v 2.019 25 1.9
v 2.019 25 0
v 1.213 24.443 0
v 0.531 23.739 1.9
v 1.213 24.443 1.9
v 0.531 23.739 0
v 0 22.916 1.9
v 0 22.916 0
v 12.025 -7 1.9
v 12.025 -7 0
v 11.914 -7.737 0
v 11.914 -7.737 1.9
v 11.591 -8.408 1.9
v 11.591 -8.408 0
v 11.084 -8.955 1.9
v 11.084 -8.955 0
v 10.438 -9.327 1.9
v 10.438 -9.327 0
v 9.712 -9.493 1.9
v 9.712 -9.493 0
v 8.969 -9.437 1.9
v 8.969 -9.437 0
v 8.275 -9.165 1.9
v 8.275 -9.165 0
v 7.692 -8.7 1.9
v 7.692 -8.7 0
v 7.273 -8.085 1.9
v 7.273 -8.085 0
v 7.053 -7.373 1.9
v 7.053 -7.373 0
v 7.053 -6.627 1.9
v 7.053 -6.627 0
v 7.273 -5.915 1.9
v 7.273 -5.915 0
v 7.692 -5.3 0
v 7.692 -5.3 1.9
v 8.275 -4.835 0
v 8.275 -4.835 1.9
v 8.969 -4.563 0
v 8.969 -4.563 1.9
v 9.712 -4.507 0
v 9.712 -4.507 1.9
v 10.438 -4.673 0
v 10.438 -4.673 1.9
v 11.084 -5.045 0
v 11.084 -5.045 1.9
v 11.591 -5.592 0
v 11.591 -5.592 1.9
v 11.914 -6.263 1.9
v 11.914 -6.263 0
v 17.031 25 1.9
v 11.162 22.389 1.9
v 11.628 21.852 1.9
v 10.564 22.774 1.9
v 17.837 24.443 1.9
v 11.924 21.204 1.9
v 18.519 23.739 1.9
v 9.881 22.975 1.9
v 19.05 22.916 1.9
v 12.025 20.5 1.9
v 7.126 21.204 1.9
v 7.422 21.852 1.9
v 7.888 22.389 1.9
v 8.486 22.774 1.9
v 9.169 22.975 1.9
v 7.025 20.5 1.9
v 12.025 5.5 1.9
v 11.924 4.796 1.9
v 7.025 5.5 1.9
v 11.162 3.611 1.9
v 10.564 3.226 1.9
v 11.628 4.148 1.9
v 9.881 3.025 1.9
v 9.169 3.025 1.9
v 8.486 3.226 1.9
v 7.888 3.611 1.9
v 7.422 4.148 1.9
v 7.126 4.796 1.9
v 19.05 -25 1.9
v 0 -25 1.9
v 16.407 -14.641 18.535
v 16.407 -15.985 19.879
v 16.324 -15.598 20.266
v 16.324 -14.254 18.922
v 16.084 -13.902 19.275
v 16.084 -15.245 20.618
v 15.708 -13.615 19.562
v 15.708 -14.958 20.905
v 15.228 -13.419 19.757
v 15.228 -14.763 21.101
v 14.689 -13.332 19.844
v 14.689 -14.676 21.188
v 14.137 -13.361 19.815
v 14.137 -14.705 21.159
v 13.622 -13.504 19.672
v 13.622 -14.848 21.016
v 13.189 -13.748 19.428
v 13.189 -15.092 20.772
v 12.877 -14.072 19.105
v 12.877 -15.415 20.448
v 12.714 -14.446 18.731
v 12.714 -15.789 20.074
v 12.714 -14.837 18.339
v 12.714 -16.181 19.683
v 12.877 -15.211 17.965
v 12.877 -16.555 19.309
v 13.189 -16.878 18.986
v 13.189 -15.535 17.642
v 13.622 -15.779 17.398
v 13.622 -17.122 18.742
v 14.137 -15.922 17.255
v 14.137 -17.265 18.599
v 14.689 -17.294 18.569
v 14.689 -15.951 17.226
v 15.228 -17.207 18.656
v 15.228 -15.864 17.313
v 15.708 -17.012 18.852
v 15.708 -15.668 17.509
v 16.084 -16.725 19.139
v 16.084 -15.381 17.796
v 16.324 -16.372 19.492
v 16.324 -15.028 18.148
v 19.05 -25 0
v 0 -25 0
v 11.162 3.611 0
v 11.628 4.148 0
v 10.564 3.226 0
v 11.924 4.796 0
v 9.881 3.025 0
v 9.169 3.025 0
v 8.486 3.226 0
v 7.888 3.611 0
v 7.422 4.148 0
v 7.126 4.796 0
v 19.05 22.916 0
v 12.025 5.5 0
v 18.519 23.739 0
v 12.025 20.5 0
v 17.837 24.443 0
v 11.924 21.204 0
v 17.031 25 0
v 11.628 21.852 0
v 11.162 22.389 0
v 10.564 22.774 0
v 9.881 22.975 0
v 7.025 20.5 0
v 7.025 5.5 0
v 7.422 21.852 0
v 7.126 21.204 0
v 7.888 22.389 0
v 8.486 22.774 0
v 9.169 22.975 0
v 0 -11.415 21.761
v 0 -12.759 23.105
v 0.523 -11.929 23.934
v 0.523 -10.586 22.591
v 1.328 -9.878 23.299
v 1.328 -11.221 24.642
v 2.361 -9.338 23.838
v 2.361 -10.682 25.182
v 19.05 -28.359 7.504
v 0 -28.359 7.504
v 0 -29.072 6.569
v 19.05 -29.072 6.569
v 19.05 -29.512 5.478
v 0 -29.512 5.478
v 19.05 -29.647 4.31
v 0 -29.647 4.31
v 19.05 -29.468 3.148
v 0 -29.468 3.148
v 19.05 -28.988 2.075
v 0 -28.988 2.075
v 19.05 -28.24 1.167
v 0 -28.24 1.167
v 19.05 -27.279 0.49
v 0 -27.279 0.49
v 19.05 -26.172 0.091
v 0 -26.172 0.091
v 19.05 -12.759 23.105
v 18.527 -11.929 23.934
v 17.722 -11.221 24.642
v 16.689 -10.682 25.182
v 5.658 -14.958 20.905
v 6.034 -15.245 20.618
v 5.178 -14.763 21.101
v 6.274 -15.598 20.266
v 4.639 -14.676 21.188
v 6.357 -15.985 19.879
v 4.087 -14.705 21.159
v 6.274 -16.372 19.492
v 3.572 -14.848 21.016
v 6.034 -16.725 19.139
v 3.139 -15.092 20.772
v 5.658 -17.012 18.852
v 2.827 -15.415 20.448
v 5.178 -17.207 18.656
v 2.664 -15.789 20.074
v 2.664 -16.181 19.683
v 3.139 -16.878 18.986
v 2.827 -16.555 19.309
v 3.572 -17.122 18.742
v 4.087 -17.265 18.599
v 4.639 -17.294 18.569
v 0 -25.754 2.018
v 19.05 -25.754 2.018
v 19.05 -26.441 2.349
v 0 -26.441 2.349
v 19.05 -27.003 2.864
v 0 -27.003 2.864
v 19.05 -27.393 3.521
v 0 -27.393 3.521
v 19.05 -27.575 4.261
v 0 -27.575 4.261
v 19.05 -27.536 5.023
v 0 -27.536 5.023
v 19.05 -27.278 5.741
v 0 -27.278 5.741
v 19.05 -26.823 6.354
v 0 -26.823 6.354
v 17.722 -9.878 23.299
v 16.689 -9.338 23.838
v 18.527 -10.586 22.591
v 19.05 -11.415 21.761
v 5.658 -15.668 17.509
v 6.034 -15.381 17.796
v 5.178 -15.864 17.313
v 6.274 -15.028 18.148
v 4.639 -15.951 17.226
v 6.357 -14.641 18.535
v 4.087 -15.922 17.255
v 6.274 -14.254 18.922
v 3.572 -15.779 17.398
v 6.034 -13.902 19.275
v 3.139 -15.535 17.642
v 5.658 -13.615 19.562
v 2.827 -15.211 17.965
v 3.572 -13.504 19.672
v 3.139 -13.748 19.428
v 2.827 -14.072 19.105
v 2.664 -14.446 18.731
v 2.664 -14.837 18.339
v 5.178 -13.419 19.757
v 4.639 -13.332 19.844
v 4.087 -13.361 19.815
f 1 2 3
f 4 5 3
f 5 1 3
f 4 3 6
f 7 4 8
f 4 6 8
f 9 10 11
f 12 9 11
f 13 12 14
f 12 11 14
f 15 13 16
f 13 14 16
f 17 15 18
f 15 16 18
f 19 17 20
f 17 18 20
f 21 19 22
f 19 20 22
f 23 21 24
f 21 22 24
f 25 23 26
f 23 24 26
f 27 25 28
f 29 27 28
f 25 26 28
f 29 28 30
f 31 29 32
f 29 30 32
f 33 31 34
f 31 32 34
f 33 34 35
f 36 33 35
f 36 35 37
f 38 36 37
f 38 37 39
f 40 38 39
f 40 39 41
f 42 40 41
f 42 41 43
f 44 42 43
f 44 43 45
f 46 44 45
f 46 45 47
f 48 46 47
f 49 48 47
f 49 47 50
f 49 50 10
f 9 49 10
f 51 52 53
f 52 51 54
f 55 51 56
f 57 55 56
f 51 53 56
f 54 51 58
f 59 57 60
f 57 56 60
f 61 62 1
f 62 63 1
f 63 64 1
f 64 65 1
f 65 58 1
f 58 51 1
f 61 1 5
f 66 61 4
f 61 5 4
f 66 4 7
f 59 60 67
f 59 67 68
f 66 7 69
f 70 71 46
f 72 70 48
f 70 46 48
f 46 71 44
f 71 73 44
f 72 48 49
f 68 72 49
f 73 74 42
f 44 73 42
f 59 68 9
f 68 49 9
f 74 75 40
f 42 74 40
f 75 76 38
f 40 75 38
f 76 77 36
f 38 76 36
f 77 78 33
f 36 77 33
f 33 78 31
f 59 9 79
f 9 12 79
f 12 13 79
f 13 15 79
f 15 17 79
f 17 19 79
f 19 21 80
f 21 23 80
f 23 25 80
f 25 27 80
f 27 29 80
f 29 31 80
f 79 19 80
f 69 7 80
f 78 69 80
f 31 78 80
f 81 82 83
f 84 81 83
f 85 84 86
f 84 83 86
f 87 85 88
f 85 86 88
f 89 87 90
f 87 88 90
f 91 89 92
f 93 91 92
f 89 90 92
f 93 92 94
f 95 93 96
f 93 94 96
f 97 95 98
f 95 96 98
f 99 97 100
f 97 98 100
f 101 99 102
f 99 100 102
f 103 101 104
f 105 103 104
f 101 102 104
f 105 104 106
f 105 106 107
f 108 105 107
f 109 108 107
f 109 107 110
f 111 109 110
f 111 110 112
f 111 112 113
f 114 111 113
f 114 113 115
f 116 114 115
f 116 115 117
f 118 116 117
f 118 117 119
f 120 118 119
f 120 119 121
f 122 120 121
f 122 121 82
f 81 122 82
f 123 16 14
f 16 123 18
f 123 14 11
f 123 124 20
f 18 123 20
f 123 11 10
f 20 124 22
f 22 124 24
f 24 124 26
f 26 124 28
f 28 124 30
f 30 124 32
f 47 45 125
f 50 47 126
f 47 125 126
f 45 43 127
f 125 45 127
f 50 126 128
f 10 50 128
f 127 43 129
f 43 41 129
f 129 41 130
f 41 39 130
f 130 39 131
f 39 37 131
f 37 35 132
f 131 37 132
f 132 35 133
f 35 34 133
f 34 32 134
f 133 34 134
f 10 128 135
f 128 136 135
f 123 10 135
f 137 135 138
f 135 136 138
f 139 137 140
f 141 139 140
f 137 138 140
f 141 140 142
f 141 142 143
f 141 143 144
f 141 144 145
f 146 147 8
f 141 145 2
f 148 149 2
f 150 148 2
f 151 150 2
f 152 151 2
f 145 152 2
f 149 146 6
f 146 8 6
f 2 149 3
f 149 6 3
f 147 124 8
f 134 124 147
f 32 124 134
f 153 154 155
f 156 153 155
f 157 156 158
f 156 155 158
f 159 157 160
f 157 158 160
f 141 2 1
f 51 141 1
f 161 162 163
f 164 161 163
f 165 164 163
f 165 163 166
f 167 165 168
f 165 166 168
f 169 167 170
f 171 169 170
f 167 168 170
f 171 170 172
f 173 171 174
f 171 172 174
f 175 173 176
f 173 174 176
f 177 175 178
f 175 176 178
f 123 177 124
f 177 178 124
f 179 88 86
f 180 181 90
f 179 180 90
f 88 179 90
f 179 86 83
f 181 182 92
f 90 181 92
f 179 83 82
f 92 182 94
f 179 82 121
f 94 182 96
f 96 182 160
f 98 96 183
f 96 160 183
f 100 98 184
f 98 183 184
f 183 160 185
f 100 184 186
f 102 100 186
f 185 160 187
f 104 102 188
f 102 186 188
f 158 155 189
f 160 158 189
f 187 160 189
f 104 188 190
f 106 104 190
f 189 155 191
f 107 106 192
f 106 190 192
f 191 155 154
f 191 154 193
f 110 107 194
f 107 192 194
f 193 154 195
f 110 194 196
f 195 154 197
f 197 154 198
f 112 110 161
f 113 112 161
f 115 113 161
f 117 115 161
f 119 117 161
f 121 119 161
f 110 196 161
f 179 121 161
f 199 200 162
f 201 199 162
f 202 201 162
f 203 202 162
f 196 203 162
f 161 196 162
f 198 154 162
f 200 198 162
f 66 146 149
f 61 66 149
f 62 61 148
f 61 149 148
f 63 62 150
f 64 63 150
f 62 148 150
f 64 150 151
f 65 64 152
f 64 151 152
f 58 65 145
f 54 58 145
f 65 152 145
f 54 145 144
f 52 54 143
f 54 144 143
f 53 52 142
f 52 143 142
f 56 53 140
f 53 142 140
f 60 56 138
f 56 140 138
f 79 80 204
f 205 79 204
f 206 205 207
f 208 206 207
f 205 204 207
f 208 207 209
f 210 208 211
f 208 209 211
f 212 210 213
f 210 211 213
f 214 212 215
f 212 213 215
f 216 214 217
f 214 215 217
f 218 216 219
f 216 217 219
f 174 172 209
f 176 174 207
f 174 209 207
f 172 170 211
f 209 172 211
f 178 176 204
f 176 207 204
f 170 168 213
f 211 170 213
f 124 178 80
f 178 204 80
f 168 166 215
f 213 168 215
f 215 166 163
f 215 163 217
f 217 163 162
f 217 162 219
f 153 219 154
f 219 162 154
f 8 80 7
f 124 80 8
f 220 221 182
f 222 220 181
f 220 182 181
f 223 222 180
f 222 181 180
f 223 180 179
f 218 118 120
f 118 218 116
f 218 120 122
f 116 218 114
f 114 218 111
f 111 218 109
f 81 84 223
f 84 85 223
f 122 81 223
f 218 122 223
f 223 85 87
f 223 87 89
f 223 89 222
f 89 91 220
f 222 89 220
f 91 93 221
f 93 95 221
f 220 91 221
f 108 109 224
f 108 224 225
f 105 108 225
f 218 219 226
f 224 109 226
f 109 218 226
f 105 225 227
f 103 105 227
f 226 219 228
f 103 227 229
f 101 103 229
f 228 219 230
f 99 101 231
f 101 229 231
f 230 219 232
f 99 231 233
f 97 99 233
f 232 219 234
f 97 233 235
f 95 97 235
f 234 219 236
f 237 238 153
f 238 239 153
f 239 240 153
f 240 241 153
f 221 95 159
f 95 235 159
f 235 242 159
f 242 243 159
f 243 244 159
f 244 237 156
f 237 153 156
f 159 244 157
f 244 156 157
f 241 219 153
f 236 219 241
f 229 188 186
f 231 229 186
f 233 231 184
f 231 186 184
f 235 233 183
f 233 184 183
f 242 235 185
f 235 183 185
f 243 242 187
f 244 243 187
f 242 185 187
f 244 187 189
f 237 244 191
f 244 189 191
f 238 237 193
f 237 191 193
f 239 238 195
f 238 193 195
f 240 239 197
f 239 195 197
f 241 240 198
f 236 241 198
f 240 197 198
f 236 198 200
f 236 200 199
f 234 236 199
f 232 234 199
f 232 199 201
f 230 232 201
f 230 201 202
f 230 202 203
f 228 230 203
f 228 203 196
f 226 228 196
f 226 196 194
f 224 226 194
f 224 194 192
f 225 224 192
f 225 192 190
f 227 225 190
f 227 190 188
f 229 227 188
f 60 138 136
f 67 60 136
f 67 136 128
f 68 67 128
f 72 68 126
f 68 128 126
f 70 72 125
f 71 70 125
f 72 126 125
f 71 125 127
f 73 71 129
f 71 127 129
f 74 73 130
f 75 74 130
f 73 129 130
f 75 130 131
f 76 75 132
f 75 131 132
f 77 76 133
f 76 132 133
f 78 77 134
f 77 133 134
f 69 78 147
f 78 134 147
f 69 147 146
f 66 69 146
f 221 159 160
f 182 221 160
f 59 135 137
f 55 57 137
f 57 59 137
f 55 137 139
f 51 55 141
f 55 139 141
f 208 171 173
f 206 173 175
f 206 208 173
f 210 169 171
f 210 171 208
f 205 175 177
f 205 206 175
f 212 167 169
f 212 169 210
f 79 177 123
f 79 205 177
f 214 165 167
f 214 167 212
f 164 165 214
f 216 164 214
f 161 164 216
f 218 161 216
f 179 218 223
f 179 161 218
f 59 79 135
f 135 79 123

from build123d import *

# Parameters (mm, degrees)
F1_DEPTH = 19.05
F2_R     = 2.5
F3_DEPTH = 22
F5_DEPTH = 25
F7_DEPTH = 5
F8_R     = 1.8568549072
F9_DEPTH = 5


with BuildPart() as f1:
    # F0 (on Right) → F1 (new body)
    with BuildSketch(Plane.YZ):
        with BuildLine():
            Line((25, 0), (25, 1.9))
            Line((25, 1.9), (-25, 1.9))
            ThreePointArc((-25, 1.9), (-27.3925963531, 3.5206705817), (-26.8228433758, 6.3537734721))
            Line((-26.8228433758, 6.3537734721), (-9.338179633, 23.8384372149))
            Line((-9.338179633, 23.8384372149), (-10.6816825172, 25.1819400992))
            Line((-10.6816825172, 25.1819400992), (-28.3593520469, 7.5042705695))
            ThreePointArc((-28.3593520469, 7.5042705695), (-29.2640479302, 2.5952189514), (-25.0000004369, 0))
            Line((-25.0000004369, 0), (25, 0))
        make_face()
    extrude(amount=F1_DEPTH)

    # F2 (on face) → F3 (cut)
    with BuildSketch(Plane(origin=(0, 0, 0), x_dir=(1, 0, 0), z_dir=(0, 0, -1))):
        with BuildLine():
            Line((7.025, -5.5), (7.025, -20.5))
            ThreePointArc((7.025, -20.5), (9.525, -23), (12.025, -20.5))
            Line((12.025, -20.5), (12.025, -5.5))
            ThreePointArc((12.025, -5.5), (9.525, -3), (7.025, -5.5))
        make_face()
        with Locations((9.525, 7)):
            Circle(F2_R)
    extrude(amount=-F3_DEPTH, mode=Mode.SUBTRACT)

    # F4 (on face) → F5 (cut)
    with BuildSketch(Plane(origin=(0, 0, 0), x_dir=(1, 0, 0), z_dir=(0, 0, -1))):
        with BuildLine():
            ThreePointArc((2.0190405194, -25), (0.8550772375, -24.1079124506), (0, -22.9164958))
            Line((0, -22.9164958), (0, -25))
            Line((0, -25), (2.0190405194, -25))
        make_face()
        with BuildLine():
            ThreePointArc((19.05, -22.9164958), (18.1949227625, -24.1079124506), (17.0309594806, -25))
            Line((17.0309594806, -25), (19.05, -25))
            Line((19.05, -25), (19.05, -22.9164958))
        make_face()
    extrude(amount=-F5_DEPTH, mode=Mode.SUBTRACT)

    # F6 (on face) → F7 (cut)
    with BuildSketch(Plane(origin=(0, -17.9318113082, 17.9318113082), x_dir=(1, 0, 0), z_dir=(0, -0.7071067812, 0.7071067812))):
        with BuildLine():
            ThreePointArc((0, 7.3159923777), (0.8932364996, 9.0155780009), (2.3611190263, 10.2532304652))
            Line((2.3611190263, 10.2532304652), (0, 10.2532304652))
            Line((0, 10.2532304652), (0, 7.3159923777))
        make_face()
        with BuildLine():
            Line((19.05, 10.2532304652), (16.6888809737, 10.2532304652))
            ThreePointArc((16.6888809737, 10.2532304652), (18.1567635004, 9.0155780009), (19.05, 7.3159923777))
            Line((19.05, 7.3159923777), (19.05, 10.2532304652))
        make_face()
    extrude(amount=-F7_DEPTH, mode=Mode.SUBTRACT)

    # F8 (on face) → F9 (cut)
    with BuildSketch(Plane(origin=(0, -17.9318113082, 17.9318113082), x_dir=(1, 0, 0), z_dir=(0, -0.7071067812, 0.7071067812))):
        with Locations((4.5, 2.7532304652)):
            Circle(F8_R)
        with Locations((14.55, 2.7532304652)):
            Circle(F8_R)
    extrude(amount=-F9_DEPTH, mode=Mode.SUBTRACT)


solid = f1.part
